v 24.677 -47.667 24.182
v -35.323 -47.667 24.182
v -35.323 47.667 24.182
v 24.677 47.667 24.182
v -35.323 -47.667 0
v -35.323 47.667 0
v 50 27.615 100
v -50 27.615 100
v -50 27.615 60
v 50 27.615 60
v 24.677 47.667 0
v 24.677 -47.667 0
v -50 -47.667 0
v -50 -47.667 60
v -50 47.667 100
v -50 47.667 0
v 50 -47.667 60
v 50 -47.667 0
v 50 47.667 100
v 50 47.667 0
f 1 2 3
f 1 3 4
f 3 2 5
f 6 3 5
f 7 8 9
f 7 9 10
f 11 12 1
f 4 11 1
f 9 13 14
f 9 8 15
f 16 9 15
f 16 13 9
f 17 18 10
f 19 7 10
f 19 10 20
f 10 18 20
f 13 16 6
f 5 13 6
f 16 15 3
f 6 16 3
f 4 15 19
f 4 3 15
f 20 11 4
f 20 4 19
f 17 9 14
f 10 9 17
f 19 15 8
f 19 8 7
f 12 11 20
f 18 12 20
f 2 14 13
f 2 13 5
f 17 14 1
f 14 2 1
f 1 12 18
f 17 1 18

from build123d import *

# Parameters (mm, degrees)
F0_W     = 100
F0_H     = 95.3330463706
F1_DEPTH = 100
F2_W     = 100
F2_H     = 75.2818412601
F3_DEPTH = 40
F4_W     = 60
F4_H     = 15.817919746
F4_H_2   = 24.182080254
F5_DEPTH = 95.3340463706


with BuildPart() as f1:
    # F0 (on Top) → F1 (new body)
    with BuildSketch(Plane.XY):
        Rectangle(F0_W, F0_H)
    extrude(amount=F1_DEPTH)

    # F2 (on face) → F3 (cut)
    with BuildSketch(Plane.XY.offset(100)):
        with Locations((0, -10.0256025552)):
            Rectangle(F2_W, F2_H)
    extrude(amount=-F3_DEPTH, mode=Mode.SUBTRACT)

    # F4 (on face) → F5 (cut, through all)
    with BuildSketch(Plane.XZ.offset(47.6665231853)):
        with Locations((-5.323157385, -7.908959873)):
            Rectangle(F4_W, F4_H)
        with Locations((-5.323157385, 12.091040127)):
            Rectangle(F4_W, F4_H_2)
    extrude(amount=-F5_DEPTH, mode=Mode.SUBTRACT)


solid = f1.part
